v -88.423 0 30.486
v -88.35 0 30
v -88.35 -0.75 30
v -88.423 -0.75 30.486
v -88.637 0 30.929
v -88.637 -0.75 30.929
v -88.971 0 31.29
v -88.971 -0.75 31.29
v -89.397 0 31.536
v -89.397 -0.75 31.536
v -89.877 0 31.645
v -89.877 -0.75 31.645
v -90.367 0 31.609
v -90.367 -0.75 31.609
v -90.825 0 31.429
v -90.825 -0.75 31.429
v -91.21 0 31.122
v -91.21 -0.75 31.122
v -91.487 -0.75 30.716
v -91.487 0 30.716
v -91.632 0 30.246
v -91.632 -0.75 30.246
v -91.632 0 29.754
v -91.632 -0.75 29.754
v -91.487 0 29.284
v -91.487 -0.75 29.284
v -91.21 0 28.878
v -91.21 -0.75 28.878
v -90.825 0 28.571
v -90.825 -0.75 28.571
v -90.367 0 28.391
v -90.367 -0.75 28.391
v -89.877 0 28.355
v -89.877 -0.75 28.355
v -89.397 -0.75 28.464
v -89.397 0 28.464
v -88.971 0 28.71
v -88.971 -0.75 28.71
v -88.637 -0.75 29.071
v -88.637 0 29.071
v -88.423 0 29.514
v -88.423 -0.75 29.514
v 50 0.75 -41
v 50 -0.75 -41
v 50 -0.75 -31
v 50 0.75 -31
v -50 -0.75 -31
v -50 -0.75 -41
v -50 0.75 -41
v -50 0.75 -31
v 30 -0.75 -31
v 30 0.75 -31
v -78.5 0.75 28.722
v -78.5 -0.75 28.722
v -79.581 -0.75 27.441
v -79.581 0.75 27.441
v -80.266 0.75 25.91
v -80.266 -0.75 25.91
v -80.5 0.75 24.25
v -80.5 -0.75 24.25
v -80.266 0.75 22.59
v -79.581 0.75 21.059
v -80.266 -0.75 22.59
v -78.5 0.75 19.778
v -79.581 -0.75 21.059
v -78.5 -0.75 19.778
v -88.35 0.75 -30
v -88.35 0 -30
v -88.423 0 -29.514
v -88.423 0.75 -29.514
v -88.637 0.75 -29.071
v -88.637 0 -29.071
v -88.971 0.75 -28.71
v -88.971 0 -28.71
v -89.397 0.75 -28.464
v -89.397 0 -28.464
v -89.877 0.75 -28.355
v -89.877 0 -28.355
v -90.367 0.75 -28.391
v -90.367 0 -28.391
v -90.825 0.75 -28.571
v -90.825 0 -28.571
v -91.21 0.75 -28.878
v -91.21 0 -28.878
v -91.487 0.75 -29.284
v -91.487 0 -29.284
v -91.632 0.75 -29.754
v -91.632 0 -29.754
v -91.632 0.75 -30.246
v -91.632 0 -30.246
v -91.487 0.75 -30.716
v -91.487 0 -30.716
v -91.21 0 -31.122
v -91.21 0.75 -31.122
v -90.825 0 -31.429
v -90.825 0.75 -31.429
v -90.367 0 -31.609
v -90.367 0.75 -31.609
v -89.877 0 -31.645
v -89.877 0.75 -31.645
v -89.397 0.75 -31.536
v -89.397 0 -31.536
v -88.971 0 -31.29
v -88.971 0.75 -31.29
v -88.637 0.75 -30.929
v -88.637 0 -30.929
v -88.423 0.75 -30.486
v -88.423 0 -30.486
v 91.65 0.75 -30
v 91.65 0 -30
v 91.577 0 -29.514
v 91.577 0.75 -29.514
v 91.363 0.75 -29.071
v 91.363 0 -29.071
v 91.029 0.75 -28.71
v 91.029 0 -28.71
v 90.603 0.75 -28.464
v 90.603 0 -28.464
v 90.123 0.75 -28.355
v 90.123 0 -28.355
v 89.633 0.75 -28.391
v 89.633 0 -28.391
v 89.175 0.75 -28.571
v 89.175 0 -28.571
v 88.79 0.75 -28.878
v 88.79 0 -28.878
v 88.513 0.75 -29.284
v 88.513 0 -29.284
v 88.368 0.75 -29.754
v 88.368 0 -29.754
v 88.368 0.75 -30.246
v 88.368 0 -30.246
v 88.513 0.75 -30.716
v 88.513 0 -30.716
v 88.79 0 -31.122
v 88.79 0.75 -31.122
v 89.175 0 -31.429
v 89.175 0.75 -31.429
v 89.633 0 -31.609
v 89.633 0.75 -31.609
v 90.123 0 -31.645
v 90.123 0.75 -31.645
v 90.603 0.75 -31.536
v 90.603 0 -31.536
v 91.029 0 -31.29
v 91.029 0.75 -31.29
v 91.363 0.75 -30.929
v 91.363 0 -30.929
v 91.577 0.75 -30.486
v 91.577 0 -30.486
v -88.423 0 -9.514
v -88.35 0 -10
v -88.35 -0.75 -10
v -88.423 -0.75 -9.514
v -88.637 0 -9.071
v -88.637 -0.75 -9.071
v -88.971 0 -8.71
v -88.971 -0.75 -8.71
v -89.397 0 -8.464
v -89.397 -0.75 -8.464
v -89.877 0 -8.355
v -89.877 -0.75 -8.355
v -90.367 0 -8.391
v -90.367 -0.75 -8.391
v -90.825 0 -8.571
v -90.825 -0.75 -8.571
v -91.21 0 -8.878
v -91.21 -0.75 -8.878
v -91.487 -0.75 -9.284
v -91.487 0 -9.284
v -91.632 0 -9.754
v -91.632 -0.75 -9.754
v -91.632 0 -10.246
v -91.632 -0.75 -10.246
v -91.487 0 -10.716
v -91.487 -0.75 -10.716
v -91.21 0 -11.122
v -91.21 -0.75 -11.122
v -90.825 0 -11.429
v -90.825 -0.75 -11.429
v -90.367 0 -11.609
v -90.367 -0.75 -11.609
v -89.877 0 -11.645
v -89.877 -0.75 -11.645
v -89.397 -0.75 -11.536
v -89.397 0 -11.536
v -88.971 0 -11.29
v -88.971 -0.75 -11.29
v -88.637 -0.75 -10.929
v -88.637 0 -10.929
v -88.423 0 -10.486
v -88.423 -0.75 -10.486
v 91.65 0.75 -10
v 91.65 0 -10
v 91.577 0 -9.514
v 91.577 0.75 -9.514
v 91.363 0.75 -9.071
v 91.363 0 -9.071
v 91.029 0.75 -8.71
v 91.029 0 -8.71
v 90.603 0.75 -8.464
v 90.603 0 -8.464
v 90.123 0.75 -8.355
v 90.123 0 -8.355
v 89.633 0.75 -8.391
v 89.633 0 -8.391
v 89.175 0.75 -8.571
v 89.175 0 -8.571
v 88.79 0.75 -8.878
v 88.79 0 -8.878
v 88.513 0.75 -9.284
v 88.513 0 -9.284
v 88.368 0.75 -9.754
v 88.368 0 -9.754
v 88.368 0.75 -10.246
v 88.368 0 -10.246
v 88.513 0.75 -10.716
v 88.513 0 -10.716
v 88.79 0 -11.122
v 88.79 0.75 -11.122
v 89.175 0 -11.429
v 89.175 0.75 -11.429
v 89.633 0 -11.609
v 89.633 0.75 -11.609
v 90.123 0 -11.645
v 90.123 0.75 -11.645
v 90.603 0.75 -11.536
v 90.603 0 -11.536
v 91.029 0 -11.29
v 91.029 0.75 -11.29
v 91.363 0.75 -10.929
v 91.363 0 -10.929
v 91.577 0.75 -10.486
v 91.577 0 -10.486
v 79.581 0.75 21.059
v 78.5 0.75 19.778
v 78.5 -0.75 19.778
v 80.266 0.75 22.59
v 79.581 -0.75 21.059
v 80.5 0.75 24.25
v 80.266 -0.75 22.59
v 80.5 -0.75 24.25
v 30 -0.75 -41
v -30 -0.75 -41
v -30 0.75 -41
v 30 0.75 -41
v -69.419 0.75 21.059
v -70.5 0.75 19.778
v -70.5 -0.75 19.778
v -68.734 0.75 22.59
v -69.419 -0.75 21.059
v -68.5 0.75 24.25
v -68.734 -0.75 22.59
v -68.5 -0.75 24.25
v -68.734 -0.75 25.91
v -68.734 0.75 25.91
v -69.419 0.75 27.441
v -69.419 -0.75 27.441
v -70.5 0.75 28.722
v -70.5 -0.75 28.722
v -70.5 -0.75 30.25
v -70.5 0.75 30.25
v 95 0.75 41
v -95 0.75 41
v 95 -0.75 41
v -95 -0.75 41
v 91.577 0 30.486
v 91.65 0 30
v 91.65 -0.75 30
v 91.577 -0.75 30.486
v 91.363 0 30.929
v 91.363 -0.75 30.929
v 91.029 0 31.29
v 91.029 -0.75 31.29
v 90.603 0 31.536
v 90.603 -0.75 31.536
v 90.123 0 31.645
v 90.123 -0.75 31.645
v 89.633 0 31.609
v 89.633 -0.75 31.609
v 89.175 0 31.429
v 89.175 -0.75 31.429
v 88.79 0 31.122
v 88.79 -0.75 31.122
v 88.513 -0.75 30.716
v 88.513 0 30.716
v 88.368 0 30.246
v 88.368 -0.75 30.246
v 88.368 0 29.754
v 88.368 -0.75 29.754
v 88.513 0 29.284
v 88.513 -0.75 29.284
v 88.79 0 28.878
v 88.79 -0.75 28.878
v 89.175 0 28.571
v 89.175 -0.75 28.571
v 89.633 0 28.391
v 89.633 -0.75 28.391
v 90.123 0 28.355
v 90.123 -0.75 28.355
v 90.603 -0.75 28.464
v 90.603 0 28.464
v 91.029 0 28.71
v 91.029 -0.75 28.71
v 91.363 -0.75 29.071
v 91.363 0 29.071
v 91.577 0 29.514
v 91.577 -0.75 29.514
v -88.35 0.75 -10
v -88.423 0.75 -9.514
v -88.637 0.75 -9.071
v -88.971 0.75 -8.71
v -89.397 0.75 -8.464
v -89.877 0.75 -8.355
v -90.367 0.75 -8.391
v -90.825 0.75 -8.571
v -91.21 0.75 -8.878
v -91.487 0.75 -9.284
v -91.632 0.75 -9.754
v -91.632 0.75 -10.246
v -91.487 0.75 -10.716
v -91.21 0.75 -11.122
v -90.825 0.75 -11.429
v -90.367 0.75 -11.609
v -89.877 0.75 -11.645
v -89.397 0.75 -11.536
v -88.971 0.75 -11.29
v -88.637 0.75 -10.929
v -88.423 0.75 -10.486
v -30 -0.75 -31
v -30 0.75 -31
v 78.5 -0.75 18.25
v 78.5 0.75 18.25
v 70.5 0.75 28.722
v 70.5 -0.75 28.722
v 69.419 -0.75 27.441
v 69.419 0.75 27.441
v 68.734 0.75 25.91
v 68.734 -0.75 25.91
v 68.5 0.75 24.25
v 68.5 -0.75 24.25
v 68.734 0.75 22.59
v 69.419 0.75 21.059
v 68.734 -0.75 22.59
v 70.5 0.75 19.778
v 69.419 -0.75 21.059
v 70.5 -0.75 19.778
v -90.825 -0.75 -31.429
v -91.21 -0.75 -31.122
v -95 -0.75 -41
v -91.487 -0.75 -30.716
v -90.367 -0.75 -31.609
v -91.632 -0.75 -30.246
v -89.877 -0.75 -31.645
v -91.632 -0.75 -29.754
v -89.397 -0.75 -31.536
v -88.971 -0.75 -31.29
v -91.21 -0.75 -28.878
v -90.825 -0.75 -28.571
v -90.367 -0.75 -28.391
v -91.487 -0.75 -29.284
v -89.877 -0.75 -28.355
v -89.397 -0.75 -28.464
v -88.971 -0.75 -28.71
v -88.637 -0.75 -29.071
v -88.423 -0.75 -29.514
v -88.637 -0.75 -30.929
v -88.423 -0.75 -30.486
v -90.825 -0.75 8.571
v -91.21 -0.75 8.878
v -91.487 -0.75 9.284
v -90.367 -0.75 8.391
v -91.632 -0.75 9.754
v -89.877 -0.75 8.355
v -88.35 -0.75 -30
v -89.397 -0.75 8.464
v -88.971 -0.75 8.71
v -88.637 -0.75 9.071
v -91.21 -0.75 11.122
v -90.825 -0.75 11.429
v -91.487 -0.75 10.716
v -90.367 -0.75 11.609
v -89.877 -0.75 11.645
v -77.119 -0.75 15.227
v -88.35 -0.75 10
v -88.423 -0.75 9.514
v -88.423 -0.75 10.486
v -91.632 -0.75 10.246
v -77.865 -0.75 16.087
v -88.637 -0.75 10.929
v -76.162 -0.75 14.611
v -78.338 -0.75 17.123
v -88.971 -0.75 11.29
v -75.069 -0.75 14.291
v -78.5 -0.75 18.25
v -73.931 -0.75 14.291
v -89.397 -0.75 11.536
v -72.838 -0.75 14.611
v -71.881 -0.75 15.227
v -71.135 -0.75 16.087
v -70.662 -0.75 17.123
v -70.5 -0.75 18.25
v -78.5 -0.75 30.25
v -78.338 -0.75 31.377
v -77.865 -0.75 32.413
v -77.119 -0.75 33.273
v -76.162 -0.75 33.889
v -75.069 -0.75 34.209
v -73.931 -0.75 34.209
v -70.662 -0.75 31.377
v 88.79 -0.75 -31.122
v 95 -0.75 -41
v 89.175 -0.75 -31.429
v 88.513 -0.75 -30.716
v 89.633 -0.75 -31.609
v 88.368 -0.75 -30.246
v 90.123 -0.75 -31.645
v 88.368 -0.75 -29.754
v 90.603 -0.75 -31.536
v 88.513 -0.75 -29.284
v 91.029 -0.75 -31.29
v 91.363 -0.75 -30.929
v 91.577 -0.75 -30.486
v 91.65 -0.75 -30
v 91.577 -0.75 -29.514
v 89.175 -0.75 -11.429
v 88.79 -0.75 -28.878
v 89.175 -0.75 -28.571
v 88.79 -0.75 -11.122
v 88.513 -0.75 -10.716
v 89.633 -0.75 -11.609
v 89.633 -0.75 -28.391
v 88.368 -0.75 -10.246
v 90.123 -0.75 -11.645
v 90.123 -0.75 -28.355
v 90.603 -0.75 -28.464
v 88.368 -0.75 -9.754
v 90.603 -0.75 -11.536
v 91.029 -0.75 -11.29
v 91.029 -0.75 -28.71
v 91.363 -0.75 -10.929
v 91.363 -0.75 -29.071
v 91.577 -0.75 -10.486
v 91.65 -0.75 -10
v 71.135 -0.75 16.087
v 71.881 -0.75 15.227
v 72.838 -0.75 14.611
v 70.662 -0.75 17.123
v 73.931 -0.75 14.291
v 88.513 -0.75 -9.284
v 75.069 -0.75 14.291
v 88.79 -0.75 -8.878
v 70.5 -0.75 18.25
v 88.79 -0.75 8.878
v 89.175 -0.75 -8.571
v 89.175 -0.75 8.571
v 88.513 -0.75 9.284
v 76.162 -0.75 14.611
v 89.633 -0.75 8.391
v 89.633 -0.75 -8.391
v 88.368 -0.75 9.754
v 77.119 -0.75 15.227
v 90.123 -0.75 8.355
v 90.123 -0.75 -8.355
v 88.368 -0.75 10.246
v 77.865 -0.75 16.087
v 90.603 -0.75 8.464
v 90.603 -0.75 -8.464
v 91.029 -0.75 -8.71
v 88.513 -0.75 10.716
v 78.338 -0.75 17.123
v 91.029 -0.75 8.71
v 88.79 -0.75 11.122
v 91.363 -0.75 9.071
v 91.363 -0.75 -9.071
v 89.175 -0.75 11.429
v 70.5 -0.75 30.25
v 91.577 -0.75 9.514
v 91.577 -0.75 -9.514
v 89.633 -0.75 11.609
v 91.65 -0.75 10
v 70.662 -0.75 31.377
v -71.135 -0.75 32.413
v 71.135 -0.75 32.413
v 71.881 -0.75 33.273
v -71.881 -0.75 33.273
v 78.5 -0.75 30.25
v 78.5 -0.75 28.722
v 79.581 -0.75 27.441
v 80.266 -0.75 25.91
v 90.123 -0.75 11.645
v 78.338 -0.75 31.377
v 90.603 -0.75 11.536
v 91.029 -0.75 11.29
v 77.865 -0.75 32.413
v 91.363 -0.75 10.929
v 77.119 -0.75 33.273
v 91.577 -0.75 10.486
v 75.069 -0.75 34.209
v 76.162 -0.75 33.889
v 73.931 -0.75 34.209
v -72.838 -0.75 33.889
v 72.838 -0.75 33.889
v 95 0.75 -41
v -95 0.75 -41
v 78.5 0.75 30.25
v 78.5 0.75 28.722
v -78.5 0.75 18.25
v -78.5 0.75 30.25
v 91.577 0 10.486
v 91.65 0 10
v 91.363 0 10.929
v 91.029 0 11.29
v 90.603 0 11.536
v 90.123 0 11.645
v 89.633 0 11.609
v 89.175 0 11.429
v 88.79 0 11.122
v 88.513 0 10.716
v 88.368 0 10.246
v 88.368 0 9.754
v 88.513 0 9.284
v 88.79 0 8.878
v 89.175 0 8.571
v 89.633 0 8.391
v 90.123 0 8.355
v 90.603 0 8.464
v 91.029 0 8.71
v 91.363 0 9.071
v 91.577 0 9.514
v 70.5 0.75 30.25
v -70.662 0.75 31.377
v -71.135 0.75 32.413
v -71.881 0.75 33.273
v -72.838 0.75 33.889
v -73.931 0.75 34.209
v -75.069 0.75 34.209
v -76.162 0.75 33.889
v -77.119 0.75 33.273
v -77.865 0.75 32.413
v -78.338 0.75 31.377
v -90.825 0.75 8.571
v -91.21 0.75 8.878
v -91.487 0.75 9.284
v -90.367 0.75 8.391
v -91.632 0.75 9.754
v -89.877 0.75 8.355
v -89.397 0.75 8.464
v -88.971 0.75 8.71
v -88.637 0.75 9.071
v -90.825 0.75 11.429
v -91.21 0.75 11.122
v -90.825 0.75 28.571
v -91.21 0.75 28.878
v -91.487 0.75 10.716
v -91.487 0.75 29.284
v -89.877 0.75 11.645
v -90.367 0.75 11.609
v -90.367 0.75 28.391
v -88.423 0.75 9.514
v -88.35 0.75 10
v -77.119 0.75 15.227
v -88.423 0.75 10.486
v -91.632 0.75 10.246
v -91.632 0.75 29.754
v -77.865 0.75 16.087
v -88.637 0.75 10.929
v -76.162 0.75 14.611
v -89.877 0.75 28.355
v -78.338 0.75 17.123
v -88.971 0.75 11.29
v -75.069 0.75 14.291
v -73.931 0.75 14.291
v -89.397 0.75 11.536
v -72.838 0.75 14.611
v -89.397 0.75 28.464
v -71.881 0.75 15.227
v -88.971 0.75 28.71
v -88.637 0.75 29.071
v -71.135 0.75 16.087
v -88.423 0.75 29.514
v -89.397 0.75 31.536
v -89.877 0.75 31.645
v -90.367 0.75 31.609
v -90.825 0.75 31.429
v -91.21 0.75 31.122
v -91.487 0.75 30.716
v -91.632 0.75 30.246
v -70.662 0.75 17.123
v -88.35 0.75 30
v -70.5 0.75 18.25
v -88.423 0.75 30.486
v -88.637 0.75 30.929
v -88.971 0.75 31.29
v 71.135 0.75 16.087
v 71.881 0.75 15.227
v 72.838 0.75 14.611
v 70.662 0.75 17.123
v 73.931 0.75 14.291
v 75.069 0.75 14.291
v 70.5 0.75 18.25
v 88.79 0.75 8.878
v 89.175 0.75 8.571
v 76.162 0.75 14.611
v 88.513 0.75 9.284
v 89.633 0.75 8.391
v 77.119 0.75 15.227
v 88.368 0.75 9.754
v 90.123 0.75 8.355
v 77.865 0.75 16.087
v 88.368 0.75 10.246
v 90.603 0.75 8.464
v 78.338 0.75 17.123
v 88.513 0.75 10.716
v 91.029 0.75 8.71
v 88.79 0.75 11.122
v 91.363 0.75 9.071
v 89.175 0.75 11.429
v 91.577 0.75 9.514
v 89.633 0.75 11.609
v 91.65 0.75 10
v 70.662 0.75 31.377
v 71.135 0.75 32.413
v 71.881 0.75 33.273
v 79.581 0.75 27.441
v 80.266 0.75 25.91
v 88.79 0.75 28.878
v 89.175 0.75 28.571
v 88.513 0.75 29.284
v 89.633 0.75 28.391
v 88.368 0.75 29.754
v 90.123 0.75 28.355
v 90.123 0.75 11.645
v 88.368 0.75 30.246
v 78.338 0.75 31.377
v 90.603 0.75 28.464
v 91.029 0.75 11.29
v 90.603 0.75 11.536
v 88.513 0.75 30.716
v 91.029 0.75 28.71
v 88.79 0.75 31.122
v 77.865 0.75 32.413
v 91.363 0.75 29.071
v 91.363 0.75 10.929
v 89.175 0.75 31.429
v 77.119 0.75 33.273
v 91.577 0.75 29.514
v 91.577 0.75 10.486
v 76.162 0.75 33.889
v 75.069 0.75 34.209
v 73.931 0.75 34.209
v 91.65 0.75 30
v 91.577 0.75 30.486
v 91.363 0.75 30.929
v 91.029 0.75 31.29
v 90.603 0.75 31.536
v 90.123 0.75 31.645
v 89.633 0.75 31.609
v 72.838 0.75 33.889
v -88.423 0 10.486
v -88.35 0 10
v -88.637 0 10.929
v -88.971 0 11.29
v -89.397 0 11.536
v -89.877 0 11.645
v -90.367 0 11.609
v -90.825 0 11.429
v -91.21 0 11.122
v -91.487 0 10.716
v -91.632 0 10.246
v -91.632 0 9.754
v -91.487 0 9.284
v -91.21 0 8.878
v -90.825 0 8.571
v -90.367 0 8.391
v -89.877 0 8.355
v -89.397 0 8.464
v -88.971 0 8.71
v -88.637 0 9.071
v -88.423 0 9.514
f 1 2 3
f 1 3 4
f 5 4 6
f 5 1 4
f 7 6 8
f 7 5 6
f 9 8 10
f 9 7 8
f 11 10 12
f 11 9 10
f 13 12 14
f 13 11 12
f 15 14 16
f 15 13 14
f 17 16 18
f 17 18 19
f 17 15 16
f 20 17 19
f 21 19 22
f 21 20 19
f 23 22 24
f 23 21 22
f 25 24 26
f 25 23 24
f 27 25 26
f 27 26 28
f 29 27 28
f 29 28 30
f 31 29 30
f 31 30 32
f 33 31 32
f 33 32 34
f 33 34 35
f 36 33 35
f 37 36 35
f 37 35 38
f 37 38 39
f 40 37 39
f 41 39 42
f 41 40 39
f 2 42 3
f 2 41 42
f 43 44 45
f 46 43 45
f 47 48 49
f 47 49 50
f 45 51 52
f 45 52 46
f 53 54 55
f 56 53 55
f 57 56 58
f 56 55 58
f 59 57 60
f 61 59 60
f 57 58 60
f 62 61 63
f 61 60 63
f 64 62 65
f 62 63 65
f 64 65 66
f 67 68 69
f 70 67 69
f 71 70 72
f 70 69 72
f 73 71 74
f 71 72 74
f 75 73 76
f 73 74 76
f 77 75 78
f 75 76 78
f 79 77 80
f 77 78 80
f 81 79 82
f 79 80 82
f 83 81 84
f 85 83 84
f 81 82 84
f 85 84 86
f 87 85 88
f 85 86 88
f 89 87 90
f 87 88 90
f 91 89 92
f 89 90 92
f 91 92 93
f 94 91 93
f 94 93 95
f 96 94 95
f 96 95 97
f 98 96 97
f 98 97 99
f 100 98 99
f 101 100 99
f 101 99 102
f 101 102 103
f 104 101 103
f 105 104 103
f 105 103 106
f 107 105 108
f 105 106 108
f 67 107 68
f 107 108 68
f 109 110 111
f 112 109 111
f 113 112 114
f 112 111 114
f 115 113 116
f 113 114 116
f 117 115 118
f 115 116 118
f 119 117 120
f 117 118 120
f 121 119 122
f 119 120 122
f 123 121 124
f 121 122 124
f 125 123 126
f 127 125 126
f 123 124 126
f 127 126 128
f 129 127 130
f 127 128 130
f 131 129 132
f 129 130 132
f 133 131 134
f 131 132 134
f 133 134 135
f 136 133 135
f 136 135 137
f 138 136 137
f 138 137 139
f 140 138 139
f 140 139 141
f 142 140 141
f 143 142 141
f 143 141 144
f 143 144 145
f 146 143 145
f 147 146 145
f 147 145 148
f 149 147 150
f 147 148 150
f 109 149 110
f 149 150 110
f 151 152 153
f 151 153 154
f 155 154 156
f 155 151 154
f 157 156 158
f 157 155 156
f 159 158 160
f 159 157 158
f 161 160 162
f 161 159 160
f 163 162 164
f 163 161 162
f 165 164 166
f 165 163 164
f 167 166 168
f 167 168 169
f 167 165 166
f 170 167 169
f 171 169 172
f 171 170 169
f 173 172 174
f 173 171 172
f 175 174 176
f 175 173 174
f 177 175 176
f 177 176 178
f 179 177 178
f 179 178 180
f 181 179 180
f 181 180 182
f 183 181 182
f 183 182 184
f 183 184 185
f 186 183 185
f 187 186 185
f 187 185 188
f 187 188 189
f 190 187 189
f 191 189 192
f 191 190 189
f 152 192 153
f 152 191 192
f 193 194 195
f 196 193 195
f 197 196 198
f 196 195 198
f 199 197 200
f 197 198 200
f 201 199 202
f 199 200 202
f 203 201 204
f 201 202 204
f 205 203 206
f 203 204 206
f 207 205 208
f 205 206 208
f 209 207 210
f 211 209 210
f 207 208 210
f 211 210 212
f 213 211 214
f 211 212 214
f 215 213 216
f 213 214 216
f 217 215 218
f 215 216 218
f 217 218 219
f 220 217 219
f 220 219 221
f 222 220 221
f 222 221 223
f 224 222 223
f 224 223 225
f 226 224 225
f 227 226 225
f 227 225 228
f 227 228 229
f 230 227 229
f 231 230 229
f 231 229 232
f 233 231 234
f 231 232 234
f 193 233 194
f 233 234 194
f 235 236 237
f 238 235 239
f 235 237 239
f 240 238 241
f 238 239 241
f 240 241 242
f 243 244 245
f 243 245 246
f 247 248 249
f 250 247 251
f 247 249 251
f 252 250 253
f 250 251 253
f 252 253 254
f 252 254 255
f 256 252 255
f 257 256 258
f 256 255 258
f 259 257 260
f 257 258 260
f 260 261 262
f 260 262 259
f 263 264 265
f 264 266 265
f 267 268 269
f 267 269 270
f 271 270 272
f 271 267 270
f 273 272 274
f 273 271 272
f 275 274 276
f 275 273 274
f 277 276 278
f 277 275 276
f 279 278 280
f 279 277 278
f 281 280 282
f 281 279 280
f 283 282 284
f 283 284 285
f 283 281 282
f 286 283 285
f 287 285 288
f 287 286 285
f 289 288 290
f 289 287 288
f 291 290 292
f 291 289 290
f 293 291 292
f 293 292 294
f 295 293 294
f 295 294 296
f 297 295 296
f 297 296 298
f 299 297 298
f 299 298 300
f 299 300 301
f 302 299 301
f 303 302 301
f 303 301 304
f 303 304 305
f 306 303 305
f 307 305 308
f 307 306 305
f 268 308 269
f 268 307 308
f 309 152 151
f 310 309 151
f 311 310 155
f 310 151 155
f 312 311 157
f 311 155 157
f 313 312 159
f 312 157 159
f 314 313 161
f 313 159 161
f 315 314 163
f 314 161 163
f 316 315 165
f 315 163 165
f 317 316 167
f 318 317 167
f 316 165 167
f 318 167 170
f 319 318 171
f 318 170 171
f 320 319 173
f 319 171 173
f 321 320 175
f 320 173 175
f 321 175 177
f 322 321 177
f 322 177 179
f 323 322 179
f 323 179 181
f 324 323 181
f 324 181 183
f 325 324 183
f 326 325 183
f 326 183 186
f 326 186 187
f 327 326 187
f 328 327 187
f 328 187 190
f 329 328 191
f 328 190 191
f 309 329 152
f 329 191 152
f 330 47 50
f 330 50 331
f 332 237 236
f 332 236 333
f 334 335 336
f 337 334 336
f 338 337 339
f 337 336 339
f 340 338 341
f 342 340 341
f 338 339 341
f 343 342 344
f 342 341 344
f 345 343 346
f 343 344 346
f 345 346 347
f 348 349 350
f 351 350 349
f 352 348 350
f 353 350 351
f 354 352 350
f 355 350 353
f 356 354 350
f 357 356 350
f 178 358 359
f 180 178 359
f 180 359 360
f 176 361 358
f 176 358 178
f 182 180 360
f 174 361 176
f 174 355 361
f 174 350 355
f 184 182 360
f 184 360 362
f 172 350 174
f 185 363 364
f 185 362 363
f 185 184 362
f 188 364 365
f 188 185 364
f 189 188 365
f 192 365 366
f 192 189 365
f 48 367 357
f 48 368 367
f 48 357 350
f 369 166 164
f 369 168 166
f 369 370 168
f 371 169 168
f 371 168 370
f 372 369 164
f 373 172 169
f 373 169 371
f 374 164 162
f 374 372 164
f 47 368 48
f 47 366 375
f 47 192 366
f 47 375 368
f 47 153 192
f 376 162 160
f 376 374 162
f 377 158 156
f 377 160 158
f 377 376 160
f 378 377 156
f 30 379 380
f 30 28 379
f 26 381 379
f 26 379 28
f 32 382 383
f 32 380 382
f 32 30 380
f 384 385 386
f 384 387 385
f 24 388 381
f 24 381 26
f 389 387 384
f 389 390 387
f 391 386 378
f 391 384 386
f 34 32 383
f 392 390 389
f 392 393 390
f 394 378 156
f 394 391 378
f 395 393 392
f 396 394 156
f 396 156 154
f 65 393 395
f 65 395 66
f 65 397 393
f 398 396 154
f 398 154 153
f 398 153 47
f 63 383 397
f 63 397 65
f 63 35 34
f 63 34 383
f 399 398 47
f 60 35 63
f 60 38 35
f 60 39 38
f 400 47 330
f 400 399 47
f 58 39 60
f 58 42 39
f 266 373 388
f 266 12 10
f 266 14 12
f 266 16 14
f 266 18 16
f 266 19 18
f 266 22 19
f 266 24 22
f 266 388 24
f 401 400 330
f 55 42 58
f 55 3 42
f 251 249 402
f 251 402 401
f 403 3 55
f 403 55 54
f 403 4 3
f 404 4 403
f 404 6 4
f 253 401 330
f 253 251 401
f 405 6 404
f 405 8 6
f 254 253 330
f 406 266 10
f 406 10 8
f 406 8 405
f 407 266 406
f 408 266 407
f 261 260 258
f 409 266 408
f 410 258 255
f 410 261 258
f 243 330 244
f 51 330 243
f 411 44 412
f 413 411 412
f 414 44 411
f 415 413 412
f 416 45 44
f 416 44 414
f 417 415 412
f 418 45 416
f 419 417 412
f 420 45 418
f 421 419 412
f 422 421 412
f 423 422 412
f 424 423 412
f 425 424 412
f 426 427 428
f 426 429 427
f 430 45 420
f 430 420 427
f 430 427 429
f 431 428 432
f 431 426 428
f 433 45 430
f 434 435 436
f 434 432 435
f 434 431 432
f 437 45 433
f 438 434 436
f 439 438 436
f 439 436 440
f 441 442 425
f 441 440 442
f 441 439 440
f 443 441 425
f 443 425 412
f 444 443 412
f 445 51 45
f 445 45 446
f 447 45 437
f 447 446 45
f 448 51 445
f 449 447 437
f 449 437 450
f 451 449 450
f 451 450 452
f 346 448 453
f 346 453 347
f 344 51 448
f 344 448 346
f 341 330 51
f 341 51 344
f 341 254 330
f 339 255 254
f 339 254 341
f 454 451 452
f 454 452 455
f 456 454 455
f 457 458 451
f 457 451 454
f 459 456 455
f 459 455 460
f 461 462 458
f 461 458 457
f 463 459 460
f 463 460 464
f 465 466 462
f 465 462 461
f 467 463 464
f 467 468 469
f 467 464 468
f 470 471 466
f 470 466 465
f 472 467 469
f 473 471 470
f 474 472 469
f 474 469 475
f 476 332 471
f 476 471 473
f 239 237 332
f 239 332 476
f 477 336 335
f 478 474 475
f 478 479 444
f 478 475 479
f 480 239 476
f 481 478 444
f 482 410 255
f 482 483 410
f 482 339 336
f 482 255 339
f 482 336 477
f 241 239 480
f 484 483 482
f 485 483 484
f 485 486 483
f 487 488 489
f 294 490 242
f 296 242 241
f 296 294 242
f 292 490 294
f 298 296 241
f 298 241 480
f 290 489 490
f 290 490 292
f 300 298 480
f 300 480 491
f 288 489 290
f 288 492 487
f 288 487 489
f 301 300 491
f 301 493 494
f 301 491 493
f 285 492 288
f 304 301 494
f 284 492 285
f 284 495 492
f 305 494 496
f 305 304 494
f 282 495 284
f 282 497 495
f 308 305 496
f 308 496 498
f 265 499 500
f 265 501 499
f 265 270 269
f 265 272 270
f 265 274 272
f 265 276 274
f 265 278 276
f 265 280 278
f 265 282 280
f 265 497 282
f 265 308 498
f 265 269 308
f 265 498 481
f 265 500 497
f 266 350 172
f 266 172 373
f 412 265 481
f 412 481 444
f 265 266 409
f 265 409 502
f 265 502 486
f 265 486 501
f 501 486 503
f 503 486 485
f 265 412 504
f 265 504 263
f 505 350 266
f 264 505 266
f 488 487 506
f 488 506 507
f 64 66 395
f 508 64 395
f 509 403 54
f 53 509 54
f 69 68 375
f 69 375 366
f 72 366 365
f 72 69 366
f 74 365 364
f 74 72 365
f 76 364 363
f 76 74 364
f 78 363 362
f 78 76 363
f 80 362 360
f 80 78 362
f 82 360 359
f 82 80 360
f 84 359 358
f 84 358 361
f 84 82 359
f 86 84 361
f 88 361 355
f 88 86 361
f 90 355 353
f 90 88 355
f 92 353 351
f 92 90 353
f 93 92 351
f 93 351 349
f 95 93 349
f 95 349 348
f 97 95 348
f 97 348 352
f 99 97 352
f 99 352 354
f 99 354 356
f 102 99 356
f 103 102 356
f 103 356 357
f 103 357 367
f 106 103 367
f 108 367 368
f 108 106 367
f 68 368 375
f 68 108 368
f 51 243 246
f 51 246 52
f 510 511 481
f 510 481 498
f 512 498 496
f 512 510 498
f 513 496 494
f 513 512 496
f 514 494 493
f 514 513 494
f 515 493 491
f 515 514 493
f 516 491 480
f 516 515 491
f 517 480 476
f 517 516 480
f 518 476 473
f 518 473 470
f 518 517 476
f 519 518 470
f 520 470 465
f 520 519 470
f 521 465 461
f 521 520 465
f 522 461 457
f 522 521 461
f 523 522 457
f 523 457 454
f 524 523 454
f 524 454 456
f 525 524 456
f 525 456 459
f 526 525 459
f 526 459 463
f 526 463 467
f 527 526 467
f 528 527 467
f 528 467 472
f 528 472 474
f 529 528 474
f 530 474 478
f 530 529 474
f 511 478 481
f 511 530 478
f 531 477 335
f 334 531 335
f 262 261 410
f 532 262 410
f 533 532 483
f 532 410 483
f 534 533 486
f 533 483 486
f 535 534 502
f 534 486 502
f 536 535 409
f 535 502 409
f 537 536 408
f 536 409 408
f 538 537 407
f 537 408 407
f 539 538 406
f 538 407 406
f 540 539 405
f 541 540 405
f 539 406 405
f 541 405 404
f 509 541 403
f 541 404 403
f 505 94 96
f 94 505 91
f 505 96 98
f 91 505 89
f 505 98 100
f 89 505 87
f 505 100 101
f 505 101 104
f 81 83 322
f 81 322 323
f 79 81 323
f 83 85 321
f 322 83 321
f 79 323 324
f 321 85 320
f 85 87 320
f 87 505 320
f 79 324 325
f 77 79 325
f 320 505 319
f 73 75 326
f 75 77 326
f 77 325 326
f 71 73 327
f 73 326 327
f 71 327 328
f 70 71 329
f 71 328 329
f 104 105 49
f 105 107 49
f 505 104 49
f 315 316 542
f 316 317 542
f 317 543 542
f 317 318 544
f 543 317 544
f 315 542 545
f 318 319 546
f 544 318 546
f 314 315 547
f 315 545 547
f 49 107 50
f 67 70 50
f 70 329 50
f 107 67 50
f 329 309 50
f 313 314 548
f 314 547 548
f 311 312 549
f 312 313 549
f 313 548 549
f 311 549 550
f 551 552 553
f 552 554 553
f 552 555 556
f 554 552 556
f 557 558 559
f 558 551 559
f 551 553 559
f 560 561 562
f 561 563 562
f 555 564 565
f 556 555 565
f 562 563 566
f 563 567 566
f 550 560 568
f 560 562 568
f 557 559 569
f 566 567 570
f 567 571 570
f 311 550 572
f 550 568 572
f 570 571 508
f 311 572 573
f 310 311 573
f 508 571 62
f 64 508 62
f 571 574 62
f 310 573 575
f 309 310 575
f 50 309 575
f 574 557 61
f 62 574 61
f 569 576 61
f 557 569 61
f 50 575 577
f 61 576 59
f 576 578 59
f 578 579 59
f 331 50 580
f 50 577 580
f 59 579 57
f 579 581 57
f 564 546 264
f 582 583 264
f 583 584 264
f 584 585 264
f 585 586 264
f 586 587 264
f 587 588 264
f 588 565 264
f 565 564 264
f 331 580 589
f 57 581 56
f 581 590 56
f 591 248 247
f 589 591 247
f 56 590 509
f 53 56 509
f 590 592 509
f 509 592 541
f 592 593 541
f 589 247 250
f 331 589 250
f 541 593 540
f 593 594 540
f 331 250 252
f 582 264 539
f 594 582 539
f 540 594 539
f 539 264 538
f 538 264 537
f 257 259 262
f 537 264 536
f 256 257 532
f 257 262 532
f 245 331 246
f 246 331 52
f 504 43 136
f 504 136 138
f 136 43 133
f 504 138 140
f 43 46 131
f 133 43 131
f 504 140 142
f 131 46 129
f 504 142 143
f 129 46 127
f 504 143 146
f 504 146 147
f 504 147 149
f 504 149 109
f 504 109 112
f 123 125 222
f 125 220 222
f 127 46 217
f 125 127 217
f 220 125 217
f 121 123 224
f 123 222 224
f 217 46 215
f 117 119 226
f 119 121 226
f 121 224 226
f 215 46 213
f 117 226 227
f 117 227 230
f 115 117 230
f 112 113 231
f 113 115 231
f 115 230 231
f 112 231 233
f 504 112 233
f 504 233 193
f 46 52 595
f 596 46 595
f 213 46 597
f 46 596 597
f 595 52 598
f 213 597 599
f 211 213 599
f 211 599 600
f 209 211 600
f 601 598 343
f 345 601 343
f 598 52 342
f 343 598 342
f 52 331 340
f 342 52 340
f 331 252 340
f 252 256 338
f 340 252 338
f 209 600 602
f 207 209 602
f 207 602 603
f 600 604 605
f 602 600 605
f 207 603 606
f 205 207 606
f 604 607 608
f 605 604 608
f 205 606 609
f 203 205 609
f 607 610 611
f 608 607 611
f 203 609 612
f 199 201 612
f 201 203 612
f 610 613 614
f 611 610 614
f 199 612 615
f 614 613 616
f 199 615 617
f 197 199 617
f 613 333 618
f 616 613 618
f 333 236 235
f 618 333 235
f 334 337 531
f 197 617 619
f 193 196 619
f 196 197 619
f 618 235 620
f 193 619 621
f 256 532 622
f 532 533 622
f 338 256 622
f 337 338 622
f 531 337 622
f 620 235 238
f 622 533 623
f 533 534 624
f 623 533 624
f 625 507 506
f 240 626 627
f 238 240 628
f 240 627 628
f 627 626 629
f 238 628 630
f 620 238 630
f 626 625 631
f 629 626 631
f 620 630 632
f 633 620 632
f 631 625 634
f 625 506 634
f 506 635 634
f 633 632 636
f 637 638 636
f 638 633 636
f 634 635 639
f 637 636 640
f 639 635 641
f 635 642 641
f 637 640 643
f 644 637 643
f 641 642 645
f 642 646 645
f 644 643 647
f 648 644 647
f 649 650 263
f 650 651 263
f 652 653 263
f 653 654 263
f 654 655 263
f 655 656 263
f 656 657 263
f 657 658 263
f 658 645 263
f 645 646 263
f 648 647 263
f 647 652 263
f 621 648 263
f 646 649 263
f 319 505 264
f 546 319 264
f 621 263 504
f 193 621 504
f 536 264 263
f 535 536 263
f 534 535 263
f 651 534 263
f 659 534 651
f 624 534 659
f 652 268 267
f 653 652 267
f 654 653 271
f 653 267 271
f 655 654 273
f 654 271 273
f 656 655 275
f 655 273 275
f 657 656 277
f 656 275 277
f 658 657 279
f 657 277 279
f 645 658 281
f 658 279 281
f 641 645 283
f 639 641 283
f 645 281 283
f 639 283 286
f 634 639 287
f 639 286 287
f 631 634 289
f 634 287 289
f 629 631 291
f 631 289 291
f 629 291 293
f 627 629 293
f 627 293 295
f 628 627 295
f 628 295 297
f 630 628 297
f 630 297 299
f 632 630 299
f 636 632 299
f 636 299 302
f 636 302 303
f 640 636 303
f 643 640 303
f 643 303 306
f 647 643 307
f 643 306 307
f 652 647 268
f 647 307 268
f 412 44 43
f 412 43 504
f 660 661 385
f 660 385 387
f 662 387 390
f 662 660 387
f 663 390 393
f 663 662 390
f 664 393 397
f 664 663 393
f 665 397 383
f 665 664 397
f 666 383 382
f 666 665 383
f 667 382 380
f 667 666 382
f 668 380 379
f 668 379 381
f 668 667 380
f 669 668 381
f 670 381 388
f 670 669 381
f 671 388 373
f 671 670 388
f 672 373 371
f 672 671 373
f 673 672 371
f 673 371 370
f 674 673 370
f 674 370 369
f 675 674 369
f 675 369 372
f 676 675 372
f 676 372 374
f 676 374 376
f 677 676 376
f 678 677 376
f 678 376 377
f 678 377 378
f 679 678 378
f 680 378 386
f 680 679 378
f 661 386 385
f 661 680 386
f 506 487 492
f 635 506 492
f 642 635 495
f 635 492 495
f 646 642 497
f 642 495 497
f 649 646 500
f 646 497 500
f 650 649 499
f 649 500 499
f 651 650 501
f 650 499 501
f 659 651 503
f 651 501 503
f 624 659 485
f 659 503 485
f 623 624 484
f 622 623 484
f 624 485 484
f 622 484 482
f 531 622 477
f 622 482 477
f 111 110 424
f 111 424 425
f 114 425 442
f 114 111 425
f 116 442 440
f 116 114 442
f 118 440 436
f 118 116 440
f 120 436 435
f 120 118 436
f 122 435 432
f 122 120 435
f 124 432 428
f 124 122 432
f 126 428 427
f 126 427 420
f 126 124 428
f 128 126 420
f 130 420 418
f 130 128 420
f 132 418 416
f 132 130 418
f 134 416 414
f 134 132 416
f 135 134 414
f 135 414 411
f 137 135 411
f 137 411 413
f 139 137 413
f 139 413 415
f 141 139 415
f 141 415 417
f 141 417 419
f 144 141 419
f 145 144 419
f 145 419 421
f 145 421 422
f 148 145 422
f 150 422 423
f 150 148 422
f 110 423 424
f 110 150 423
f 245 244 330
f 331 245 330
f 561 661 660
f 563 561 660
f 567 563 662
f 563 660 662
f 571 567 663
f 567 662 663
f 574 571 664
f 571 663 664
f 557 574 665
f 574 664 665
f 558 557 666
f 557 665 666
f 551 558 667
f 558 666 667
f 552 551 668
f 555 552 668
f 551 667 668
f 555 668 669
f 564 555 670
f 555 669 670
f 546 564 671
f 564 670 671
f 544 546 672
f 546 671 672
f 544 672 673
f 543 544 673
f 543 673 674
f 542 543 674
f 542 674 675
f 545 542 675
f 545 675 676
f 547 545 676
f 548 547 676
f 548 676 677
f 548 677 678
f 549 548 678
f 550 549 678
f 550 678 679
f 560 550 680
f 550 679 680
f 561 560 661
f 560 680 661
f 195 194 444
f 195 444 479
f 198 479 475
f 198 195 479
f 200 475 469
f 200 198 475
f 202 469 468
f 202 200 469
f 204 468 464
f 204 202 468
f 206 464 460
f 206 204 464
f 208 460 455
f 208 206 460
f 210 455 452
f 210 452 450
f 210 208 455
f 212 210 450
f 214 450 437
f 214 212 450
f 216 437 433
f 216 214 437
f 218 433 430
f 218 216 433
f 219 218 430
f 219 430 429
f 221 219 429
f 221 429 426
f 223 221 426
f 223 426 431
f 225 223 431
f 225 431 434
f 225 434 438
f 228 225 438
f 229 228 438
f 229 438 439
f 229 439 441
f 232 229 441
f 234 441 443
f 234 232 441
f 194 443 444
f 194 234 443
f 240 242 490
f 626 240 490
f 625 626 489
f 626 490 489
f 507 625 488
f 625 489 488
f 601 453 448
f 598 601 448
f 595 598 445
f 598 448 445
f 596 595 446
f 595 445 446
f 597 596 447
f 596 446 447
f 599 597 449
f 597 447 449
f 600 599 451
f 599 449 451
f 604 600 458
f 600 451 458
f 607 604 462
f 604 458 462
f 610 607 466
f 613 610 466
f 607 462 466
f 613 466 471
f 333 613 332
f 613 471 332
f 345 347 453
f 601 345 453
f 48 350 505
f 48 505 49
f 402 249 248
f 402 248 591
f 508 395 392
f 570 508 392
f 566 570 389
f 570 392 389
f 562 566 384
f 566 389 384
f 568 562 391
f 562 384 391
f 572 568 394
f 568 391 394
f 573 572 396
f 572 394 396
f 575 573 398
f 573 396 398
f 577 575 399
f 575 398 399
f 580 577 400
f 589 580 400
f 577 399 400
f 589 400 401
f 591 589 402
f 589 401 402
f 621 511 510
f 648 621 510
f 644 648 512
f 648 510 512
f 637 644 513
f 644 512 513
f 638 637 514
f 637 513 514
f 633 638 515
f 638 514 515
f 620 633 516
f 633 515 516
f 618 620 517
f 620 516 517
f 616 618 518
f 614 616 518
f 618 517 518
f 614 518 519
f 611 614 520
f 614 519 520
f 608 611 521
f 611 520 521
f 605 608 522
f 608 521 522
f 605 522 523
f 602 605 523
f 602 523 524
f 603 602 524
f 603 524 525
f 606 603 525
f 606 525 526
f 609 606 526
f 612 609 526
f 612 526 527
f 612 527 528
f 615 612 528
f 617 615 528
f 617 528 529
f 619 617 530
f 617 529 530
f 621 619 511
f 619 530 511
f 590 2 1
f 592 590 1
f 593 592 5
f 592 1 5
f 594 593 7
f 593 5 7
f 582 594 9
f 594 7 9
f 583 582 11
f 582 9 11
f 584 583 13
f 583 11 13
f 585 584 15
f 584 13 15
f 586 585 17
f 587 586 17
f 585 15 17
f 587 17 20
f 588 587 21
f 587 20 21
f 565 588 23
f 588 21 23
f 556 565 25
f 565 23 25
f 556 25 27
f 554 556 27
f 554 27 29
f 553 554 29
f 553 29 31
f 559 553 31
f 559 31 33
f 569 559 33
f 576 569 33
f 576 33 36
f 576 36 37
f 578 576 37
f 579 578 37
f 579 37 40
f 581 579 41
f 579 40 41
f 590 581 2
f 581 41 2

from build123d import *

# Parameters (mm, degrees)
SKETCH_W        = 190
SKETCH_H        = 82
SKETCH_R        = 1.65
PAD_DEPTH       = 0.75
PAD_DEPTH_BACK  = 0.75
SKETCH001_W     = 20
SKETCH001_H     = 10
POCKET_DEPTH    = 1.501
POCKET001_DEPTH = 1.501
SKETCH003_R     = 6
POCKET002_DEPTH = 1.501


with BuildPart() as part:
    # Sketch → Pad (new body, two sides)
    with BuildSketch(Plane.XZ) as pad_sk:
        Rectangle(SKETCH_W, SKETCH_H)
        with Locations((90, 30)):
            Circle(SKETCH_R, mode=Mode.SUBTRACT)
        with Locations((90, 10)):
            Circle(SKETCH_R, mode=Mode.SUBTRACT)
        with Locations((90, -30)):
            Circle(SKETCH_R, mode=Mode.SUBTRACT)
        with Locations((90, -10)):
            Circle(SKETCH_R, mode=Mode.SUBTRACT)
        with Locations((-90, 30)):
            Circle(SKETCH_R, mode=Mode.SUBTRACT)
        with Locations((-90, 10)):
            Circle(SKETCH_R, mode=Mode.SUBTRACT)
        with Locations((-90, -30)):
            Circle(SKETCH_R, mode=Mode.SUBTRACT)
        with Locations((-90, -10)):
            Circle(SKETCH_R, mode=Mode.SUBTRACT)
    extrude(amount=PAD_DEPTH)
    extrude(pad_sk.sketch, amount=-PAD_DEPTH_BACK)

    # Sketch001 (on Face14 of Pad) → Pocket (cut, through all)
    with BuildSketch(Plane.XZ.offset(0.75)):
        with Locations((-40, -36)):
            Rectangle(SKETCH001_W, SKETCH001_H)
        with Locations((40, -36)):
            Rectangle(SKETCH001_W, SKETCH001_H)
    extrude(amount=-POCKET_DEPTH, mode=Mode.SUBTRACT)

    # Sketch002 (on Face5 of Pocket) → Pocket001 (cut, through all)
    with BuildSketch(Plane.XZ.offset(0.75)):
        with BuildLine():
            ThreePointArc((78.5, 30.25), (74.5, 34.25), (70.5, 30.25))
            Line((70.5, 30.25), (70.5, 18.25))
            ThreePointArc((70.5, 18.25), (74.5, 14.25), (78.5, 18.25))
            Line((78.5, 30.25), (78.5, 18.25))
        make_face()
        with BuildLine():
            ThreePointArc((-70.5, 30.25), (-74.5, 34.25), (-78.5, 30.25))
            Line((-78.5, 30.25), (-78.5, 18.25))
            ThreePointArc((-78.5, 18.25), (-74.5, 14.25), (-70.5, 18.25))
            Line((-70.5, 30.25), (-70.5, 18.25))
        make_face()
    extrude(amount=-POCKET001_DEPTH, mode=Mode.SUBTRACT)

    # Sketch003 (on Face5 of Pocket001) → Pocket002 (cut, through all)
    with BuildSketch(Plane.XZ.offset(0.75)):
        with Locations((-74.5, 24.25)):
            Circle(SKETCH003_R)
        with Locations((74.5, 24.25)):
            Circle(SKETCH003_R)
    extrude(amount=-POCKET002_DEPTH, mode=Mode.SUBTRACT)


solid = part.part
